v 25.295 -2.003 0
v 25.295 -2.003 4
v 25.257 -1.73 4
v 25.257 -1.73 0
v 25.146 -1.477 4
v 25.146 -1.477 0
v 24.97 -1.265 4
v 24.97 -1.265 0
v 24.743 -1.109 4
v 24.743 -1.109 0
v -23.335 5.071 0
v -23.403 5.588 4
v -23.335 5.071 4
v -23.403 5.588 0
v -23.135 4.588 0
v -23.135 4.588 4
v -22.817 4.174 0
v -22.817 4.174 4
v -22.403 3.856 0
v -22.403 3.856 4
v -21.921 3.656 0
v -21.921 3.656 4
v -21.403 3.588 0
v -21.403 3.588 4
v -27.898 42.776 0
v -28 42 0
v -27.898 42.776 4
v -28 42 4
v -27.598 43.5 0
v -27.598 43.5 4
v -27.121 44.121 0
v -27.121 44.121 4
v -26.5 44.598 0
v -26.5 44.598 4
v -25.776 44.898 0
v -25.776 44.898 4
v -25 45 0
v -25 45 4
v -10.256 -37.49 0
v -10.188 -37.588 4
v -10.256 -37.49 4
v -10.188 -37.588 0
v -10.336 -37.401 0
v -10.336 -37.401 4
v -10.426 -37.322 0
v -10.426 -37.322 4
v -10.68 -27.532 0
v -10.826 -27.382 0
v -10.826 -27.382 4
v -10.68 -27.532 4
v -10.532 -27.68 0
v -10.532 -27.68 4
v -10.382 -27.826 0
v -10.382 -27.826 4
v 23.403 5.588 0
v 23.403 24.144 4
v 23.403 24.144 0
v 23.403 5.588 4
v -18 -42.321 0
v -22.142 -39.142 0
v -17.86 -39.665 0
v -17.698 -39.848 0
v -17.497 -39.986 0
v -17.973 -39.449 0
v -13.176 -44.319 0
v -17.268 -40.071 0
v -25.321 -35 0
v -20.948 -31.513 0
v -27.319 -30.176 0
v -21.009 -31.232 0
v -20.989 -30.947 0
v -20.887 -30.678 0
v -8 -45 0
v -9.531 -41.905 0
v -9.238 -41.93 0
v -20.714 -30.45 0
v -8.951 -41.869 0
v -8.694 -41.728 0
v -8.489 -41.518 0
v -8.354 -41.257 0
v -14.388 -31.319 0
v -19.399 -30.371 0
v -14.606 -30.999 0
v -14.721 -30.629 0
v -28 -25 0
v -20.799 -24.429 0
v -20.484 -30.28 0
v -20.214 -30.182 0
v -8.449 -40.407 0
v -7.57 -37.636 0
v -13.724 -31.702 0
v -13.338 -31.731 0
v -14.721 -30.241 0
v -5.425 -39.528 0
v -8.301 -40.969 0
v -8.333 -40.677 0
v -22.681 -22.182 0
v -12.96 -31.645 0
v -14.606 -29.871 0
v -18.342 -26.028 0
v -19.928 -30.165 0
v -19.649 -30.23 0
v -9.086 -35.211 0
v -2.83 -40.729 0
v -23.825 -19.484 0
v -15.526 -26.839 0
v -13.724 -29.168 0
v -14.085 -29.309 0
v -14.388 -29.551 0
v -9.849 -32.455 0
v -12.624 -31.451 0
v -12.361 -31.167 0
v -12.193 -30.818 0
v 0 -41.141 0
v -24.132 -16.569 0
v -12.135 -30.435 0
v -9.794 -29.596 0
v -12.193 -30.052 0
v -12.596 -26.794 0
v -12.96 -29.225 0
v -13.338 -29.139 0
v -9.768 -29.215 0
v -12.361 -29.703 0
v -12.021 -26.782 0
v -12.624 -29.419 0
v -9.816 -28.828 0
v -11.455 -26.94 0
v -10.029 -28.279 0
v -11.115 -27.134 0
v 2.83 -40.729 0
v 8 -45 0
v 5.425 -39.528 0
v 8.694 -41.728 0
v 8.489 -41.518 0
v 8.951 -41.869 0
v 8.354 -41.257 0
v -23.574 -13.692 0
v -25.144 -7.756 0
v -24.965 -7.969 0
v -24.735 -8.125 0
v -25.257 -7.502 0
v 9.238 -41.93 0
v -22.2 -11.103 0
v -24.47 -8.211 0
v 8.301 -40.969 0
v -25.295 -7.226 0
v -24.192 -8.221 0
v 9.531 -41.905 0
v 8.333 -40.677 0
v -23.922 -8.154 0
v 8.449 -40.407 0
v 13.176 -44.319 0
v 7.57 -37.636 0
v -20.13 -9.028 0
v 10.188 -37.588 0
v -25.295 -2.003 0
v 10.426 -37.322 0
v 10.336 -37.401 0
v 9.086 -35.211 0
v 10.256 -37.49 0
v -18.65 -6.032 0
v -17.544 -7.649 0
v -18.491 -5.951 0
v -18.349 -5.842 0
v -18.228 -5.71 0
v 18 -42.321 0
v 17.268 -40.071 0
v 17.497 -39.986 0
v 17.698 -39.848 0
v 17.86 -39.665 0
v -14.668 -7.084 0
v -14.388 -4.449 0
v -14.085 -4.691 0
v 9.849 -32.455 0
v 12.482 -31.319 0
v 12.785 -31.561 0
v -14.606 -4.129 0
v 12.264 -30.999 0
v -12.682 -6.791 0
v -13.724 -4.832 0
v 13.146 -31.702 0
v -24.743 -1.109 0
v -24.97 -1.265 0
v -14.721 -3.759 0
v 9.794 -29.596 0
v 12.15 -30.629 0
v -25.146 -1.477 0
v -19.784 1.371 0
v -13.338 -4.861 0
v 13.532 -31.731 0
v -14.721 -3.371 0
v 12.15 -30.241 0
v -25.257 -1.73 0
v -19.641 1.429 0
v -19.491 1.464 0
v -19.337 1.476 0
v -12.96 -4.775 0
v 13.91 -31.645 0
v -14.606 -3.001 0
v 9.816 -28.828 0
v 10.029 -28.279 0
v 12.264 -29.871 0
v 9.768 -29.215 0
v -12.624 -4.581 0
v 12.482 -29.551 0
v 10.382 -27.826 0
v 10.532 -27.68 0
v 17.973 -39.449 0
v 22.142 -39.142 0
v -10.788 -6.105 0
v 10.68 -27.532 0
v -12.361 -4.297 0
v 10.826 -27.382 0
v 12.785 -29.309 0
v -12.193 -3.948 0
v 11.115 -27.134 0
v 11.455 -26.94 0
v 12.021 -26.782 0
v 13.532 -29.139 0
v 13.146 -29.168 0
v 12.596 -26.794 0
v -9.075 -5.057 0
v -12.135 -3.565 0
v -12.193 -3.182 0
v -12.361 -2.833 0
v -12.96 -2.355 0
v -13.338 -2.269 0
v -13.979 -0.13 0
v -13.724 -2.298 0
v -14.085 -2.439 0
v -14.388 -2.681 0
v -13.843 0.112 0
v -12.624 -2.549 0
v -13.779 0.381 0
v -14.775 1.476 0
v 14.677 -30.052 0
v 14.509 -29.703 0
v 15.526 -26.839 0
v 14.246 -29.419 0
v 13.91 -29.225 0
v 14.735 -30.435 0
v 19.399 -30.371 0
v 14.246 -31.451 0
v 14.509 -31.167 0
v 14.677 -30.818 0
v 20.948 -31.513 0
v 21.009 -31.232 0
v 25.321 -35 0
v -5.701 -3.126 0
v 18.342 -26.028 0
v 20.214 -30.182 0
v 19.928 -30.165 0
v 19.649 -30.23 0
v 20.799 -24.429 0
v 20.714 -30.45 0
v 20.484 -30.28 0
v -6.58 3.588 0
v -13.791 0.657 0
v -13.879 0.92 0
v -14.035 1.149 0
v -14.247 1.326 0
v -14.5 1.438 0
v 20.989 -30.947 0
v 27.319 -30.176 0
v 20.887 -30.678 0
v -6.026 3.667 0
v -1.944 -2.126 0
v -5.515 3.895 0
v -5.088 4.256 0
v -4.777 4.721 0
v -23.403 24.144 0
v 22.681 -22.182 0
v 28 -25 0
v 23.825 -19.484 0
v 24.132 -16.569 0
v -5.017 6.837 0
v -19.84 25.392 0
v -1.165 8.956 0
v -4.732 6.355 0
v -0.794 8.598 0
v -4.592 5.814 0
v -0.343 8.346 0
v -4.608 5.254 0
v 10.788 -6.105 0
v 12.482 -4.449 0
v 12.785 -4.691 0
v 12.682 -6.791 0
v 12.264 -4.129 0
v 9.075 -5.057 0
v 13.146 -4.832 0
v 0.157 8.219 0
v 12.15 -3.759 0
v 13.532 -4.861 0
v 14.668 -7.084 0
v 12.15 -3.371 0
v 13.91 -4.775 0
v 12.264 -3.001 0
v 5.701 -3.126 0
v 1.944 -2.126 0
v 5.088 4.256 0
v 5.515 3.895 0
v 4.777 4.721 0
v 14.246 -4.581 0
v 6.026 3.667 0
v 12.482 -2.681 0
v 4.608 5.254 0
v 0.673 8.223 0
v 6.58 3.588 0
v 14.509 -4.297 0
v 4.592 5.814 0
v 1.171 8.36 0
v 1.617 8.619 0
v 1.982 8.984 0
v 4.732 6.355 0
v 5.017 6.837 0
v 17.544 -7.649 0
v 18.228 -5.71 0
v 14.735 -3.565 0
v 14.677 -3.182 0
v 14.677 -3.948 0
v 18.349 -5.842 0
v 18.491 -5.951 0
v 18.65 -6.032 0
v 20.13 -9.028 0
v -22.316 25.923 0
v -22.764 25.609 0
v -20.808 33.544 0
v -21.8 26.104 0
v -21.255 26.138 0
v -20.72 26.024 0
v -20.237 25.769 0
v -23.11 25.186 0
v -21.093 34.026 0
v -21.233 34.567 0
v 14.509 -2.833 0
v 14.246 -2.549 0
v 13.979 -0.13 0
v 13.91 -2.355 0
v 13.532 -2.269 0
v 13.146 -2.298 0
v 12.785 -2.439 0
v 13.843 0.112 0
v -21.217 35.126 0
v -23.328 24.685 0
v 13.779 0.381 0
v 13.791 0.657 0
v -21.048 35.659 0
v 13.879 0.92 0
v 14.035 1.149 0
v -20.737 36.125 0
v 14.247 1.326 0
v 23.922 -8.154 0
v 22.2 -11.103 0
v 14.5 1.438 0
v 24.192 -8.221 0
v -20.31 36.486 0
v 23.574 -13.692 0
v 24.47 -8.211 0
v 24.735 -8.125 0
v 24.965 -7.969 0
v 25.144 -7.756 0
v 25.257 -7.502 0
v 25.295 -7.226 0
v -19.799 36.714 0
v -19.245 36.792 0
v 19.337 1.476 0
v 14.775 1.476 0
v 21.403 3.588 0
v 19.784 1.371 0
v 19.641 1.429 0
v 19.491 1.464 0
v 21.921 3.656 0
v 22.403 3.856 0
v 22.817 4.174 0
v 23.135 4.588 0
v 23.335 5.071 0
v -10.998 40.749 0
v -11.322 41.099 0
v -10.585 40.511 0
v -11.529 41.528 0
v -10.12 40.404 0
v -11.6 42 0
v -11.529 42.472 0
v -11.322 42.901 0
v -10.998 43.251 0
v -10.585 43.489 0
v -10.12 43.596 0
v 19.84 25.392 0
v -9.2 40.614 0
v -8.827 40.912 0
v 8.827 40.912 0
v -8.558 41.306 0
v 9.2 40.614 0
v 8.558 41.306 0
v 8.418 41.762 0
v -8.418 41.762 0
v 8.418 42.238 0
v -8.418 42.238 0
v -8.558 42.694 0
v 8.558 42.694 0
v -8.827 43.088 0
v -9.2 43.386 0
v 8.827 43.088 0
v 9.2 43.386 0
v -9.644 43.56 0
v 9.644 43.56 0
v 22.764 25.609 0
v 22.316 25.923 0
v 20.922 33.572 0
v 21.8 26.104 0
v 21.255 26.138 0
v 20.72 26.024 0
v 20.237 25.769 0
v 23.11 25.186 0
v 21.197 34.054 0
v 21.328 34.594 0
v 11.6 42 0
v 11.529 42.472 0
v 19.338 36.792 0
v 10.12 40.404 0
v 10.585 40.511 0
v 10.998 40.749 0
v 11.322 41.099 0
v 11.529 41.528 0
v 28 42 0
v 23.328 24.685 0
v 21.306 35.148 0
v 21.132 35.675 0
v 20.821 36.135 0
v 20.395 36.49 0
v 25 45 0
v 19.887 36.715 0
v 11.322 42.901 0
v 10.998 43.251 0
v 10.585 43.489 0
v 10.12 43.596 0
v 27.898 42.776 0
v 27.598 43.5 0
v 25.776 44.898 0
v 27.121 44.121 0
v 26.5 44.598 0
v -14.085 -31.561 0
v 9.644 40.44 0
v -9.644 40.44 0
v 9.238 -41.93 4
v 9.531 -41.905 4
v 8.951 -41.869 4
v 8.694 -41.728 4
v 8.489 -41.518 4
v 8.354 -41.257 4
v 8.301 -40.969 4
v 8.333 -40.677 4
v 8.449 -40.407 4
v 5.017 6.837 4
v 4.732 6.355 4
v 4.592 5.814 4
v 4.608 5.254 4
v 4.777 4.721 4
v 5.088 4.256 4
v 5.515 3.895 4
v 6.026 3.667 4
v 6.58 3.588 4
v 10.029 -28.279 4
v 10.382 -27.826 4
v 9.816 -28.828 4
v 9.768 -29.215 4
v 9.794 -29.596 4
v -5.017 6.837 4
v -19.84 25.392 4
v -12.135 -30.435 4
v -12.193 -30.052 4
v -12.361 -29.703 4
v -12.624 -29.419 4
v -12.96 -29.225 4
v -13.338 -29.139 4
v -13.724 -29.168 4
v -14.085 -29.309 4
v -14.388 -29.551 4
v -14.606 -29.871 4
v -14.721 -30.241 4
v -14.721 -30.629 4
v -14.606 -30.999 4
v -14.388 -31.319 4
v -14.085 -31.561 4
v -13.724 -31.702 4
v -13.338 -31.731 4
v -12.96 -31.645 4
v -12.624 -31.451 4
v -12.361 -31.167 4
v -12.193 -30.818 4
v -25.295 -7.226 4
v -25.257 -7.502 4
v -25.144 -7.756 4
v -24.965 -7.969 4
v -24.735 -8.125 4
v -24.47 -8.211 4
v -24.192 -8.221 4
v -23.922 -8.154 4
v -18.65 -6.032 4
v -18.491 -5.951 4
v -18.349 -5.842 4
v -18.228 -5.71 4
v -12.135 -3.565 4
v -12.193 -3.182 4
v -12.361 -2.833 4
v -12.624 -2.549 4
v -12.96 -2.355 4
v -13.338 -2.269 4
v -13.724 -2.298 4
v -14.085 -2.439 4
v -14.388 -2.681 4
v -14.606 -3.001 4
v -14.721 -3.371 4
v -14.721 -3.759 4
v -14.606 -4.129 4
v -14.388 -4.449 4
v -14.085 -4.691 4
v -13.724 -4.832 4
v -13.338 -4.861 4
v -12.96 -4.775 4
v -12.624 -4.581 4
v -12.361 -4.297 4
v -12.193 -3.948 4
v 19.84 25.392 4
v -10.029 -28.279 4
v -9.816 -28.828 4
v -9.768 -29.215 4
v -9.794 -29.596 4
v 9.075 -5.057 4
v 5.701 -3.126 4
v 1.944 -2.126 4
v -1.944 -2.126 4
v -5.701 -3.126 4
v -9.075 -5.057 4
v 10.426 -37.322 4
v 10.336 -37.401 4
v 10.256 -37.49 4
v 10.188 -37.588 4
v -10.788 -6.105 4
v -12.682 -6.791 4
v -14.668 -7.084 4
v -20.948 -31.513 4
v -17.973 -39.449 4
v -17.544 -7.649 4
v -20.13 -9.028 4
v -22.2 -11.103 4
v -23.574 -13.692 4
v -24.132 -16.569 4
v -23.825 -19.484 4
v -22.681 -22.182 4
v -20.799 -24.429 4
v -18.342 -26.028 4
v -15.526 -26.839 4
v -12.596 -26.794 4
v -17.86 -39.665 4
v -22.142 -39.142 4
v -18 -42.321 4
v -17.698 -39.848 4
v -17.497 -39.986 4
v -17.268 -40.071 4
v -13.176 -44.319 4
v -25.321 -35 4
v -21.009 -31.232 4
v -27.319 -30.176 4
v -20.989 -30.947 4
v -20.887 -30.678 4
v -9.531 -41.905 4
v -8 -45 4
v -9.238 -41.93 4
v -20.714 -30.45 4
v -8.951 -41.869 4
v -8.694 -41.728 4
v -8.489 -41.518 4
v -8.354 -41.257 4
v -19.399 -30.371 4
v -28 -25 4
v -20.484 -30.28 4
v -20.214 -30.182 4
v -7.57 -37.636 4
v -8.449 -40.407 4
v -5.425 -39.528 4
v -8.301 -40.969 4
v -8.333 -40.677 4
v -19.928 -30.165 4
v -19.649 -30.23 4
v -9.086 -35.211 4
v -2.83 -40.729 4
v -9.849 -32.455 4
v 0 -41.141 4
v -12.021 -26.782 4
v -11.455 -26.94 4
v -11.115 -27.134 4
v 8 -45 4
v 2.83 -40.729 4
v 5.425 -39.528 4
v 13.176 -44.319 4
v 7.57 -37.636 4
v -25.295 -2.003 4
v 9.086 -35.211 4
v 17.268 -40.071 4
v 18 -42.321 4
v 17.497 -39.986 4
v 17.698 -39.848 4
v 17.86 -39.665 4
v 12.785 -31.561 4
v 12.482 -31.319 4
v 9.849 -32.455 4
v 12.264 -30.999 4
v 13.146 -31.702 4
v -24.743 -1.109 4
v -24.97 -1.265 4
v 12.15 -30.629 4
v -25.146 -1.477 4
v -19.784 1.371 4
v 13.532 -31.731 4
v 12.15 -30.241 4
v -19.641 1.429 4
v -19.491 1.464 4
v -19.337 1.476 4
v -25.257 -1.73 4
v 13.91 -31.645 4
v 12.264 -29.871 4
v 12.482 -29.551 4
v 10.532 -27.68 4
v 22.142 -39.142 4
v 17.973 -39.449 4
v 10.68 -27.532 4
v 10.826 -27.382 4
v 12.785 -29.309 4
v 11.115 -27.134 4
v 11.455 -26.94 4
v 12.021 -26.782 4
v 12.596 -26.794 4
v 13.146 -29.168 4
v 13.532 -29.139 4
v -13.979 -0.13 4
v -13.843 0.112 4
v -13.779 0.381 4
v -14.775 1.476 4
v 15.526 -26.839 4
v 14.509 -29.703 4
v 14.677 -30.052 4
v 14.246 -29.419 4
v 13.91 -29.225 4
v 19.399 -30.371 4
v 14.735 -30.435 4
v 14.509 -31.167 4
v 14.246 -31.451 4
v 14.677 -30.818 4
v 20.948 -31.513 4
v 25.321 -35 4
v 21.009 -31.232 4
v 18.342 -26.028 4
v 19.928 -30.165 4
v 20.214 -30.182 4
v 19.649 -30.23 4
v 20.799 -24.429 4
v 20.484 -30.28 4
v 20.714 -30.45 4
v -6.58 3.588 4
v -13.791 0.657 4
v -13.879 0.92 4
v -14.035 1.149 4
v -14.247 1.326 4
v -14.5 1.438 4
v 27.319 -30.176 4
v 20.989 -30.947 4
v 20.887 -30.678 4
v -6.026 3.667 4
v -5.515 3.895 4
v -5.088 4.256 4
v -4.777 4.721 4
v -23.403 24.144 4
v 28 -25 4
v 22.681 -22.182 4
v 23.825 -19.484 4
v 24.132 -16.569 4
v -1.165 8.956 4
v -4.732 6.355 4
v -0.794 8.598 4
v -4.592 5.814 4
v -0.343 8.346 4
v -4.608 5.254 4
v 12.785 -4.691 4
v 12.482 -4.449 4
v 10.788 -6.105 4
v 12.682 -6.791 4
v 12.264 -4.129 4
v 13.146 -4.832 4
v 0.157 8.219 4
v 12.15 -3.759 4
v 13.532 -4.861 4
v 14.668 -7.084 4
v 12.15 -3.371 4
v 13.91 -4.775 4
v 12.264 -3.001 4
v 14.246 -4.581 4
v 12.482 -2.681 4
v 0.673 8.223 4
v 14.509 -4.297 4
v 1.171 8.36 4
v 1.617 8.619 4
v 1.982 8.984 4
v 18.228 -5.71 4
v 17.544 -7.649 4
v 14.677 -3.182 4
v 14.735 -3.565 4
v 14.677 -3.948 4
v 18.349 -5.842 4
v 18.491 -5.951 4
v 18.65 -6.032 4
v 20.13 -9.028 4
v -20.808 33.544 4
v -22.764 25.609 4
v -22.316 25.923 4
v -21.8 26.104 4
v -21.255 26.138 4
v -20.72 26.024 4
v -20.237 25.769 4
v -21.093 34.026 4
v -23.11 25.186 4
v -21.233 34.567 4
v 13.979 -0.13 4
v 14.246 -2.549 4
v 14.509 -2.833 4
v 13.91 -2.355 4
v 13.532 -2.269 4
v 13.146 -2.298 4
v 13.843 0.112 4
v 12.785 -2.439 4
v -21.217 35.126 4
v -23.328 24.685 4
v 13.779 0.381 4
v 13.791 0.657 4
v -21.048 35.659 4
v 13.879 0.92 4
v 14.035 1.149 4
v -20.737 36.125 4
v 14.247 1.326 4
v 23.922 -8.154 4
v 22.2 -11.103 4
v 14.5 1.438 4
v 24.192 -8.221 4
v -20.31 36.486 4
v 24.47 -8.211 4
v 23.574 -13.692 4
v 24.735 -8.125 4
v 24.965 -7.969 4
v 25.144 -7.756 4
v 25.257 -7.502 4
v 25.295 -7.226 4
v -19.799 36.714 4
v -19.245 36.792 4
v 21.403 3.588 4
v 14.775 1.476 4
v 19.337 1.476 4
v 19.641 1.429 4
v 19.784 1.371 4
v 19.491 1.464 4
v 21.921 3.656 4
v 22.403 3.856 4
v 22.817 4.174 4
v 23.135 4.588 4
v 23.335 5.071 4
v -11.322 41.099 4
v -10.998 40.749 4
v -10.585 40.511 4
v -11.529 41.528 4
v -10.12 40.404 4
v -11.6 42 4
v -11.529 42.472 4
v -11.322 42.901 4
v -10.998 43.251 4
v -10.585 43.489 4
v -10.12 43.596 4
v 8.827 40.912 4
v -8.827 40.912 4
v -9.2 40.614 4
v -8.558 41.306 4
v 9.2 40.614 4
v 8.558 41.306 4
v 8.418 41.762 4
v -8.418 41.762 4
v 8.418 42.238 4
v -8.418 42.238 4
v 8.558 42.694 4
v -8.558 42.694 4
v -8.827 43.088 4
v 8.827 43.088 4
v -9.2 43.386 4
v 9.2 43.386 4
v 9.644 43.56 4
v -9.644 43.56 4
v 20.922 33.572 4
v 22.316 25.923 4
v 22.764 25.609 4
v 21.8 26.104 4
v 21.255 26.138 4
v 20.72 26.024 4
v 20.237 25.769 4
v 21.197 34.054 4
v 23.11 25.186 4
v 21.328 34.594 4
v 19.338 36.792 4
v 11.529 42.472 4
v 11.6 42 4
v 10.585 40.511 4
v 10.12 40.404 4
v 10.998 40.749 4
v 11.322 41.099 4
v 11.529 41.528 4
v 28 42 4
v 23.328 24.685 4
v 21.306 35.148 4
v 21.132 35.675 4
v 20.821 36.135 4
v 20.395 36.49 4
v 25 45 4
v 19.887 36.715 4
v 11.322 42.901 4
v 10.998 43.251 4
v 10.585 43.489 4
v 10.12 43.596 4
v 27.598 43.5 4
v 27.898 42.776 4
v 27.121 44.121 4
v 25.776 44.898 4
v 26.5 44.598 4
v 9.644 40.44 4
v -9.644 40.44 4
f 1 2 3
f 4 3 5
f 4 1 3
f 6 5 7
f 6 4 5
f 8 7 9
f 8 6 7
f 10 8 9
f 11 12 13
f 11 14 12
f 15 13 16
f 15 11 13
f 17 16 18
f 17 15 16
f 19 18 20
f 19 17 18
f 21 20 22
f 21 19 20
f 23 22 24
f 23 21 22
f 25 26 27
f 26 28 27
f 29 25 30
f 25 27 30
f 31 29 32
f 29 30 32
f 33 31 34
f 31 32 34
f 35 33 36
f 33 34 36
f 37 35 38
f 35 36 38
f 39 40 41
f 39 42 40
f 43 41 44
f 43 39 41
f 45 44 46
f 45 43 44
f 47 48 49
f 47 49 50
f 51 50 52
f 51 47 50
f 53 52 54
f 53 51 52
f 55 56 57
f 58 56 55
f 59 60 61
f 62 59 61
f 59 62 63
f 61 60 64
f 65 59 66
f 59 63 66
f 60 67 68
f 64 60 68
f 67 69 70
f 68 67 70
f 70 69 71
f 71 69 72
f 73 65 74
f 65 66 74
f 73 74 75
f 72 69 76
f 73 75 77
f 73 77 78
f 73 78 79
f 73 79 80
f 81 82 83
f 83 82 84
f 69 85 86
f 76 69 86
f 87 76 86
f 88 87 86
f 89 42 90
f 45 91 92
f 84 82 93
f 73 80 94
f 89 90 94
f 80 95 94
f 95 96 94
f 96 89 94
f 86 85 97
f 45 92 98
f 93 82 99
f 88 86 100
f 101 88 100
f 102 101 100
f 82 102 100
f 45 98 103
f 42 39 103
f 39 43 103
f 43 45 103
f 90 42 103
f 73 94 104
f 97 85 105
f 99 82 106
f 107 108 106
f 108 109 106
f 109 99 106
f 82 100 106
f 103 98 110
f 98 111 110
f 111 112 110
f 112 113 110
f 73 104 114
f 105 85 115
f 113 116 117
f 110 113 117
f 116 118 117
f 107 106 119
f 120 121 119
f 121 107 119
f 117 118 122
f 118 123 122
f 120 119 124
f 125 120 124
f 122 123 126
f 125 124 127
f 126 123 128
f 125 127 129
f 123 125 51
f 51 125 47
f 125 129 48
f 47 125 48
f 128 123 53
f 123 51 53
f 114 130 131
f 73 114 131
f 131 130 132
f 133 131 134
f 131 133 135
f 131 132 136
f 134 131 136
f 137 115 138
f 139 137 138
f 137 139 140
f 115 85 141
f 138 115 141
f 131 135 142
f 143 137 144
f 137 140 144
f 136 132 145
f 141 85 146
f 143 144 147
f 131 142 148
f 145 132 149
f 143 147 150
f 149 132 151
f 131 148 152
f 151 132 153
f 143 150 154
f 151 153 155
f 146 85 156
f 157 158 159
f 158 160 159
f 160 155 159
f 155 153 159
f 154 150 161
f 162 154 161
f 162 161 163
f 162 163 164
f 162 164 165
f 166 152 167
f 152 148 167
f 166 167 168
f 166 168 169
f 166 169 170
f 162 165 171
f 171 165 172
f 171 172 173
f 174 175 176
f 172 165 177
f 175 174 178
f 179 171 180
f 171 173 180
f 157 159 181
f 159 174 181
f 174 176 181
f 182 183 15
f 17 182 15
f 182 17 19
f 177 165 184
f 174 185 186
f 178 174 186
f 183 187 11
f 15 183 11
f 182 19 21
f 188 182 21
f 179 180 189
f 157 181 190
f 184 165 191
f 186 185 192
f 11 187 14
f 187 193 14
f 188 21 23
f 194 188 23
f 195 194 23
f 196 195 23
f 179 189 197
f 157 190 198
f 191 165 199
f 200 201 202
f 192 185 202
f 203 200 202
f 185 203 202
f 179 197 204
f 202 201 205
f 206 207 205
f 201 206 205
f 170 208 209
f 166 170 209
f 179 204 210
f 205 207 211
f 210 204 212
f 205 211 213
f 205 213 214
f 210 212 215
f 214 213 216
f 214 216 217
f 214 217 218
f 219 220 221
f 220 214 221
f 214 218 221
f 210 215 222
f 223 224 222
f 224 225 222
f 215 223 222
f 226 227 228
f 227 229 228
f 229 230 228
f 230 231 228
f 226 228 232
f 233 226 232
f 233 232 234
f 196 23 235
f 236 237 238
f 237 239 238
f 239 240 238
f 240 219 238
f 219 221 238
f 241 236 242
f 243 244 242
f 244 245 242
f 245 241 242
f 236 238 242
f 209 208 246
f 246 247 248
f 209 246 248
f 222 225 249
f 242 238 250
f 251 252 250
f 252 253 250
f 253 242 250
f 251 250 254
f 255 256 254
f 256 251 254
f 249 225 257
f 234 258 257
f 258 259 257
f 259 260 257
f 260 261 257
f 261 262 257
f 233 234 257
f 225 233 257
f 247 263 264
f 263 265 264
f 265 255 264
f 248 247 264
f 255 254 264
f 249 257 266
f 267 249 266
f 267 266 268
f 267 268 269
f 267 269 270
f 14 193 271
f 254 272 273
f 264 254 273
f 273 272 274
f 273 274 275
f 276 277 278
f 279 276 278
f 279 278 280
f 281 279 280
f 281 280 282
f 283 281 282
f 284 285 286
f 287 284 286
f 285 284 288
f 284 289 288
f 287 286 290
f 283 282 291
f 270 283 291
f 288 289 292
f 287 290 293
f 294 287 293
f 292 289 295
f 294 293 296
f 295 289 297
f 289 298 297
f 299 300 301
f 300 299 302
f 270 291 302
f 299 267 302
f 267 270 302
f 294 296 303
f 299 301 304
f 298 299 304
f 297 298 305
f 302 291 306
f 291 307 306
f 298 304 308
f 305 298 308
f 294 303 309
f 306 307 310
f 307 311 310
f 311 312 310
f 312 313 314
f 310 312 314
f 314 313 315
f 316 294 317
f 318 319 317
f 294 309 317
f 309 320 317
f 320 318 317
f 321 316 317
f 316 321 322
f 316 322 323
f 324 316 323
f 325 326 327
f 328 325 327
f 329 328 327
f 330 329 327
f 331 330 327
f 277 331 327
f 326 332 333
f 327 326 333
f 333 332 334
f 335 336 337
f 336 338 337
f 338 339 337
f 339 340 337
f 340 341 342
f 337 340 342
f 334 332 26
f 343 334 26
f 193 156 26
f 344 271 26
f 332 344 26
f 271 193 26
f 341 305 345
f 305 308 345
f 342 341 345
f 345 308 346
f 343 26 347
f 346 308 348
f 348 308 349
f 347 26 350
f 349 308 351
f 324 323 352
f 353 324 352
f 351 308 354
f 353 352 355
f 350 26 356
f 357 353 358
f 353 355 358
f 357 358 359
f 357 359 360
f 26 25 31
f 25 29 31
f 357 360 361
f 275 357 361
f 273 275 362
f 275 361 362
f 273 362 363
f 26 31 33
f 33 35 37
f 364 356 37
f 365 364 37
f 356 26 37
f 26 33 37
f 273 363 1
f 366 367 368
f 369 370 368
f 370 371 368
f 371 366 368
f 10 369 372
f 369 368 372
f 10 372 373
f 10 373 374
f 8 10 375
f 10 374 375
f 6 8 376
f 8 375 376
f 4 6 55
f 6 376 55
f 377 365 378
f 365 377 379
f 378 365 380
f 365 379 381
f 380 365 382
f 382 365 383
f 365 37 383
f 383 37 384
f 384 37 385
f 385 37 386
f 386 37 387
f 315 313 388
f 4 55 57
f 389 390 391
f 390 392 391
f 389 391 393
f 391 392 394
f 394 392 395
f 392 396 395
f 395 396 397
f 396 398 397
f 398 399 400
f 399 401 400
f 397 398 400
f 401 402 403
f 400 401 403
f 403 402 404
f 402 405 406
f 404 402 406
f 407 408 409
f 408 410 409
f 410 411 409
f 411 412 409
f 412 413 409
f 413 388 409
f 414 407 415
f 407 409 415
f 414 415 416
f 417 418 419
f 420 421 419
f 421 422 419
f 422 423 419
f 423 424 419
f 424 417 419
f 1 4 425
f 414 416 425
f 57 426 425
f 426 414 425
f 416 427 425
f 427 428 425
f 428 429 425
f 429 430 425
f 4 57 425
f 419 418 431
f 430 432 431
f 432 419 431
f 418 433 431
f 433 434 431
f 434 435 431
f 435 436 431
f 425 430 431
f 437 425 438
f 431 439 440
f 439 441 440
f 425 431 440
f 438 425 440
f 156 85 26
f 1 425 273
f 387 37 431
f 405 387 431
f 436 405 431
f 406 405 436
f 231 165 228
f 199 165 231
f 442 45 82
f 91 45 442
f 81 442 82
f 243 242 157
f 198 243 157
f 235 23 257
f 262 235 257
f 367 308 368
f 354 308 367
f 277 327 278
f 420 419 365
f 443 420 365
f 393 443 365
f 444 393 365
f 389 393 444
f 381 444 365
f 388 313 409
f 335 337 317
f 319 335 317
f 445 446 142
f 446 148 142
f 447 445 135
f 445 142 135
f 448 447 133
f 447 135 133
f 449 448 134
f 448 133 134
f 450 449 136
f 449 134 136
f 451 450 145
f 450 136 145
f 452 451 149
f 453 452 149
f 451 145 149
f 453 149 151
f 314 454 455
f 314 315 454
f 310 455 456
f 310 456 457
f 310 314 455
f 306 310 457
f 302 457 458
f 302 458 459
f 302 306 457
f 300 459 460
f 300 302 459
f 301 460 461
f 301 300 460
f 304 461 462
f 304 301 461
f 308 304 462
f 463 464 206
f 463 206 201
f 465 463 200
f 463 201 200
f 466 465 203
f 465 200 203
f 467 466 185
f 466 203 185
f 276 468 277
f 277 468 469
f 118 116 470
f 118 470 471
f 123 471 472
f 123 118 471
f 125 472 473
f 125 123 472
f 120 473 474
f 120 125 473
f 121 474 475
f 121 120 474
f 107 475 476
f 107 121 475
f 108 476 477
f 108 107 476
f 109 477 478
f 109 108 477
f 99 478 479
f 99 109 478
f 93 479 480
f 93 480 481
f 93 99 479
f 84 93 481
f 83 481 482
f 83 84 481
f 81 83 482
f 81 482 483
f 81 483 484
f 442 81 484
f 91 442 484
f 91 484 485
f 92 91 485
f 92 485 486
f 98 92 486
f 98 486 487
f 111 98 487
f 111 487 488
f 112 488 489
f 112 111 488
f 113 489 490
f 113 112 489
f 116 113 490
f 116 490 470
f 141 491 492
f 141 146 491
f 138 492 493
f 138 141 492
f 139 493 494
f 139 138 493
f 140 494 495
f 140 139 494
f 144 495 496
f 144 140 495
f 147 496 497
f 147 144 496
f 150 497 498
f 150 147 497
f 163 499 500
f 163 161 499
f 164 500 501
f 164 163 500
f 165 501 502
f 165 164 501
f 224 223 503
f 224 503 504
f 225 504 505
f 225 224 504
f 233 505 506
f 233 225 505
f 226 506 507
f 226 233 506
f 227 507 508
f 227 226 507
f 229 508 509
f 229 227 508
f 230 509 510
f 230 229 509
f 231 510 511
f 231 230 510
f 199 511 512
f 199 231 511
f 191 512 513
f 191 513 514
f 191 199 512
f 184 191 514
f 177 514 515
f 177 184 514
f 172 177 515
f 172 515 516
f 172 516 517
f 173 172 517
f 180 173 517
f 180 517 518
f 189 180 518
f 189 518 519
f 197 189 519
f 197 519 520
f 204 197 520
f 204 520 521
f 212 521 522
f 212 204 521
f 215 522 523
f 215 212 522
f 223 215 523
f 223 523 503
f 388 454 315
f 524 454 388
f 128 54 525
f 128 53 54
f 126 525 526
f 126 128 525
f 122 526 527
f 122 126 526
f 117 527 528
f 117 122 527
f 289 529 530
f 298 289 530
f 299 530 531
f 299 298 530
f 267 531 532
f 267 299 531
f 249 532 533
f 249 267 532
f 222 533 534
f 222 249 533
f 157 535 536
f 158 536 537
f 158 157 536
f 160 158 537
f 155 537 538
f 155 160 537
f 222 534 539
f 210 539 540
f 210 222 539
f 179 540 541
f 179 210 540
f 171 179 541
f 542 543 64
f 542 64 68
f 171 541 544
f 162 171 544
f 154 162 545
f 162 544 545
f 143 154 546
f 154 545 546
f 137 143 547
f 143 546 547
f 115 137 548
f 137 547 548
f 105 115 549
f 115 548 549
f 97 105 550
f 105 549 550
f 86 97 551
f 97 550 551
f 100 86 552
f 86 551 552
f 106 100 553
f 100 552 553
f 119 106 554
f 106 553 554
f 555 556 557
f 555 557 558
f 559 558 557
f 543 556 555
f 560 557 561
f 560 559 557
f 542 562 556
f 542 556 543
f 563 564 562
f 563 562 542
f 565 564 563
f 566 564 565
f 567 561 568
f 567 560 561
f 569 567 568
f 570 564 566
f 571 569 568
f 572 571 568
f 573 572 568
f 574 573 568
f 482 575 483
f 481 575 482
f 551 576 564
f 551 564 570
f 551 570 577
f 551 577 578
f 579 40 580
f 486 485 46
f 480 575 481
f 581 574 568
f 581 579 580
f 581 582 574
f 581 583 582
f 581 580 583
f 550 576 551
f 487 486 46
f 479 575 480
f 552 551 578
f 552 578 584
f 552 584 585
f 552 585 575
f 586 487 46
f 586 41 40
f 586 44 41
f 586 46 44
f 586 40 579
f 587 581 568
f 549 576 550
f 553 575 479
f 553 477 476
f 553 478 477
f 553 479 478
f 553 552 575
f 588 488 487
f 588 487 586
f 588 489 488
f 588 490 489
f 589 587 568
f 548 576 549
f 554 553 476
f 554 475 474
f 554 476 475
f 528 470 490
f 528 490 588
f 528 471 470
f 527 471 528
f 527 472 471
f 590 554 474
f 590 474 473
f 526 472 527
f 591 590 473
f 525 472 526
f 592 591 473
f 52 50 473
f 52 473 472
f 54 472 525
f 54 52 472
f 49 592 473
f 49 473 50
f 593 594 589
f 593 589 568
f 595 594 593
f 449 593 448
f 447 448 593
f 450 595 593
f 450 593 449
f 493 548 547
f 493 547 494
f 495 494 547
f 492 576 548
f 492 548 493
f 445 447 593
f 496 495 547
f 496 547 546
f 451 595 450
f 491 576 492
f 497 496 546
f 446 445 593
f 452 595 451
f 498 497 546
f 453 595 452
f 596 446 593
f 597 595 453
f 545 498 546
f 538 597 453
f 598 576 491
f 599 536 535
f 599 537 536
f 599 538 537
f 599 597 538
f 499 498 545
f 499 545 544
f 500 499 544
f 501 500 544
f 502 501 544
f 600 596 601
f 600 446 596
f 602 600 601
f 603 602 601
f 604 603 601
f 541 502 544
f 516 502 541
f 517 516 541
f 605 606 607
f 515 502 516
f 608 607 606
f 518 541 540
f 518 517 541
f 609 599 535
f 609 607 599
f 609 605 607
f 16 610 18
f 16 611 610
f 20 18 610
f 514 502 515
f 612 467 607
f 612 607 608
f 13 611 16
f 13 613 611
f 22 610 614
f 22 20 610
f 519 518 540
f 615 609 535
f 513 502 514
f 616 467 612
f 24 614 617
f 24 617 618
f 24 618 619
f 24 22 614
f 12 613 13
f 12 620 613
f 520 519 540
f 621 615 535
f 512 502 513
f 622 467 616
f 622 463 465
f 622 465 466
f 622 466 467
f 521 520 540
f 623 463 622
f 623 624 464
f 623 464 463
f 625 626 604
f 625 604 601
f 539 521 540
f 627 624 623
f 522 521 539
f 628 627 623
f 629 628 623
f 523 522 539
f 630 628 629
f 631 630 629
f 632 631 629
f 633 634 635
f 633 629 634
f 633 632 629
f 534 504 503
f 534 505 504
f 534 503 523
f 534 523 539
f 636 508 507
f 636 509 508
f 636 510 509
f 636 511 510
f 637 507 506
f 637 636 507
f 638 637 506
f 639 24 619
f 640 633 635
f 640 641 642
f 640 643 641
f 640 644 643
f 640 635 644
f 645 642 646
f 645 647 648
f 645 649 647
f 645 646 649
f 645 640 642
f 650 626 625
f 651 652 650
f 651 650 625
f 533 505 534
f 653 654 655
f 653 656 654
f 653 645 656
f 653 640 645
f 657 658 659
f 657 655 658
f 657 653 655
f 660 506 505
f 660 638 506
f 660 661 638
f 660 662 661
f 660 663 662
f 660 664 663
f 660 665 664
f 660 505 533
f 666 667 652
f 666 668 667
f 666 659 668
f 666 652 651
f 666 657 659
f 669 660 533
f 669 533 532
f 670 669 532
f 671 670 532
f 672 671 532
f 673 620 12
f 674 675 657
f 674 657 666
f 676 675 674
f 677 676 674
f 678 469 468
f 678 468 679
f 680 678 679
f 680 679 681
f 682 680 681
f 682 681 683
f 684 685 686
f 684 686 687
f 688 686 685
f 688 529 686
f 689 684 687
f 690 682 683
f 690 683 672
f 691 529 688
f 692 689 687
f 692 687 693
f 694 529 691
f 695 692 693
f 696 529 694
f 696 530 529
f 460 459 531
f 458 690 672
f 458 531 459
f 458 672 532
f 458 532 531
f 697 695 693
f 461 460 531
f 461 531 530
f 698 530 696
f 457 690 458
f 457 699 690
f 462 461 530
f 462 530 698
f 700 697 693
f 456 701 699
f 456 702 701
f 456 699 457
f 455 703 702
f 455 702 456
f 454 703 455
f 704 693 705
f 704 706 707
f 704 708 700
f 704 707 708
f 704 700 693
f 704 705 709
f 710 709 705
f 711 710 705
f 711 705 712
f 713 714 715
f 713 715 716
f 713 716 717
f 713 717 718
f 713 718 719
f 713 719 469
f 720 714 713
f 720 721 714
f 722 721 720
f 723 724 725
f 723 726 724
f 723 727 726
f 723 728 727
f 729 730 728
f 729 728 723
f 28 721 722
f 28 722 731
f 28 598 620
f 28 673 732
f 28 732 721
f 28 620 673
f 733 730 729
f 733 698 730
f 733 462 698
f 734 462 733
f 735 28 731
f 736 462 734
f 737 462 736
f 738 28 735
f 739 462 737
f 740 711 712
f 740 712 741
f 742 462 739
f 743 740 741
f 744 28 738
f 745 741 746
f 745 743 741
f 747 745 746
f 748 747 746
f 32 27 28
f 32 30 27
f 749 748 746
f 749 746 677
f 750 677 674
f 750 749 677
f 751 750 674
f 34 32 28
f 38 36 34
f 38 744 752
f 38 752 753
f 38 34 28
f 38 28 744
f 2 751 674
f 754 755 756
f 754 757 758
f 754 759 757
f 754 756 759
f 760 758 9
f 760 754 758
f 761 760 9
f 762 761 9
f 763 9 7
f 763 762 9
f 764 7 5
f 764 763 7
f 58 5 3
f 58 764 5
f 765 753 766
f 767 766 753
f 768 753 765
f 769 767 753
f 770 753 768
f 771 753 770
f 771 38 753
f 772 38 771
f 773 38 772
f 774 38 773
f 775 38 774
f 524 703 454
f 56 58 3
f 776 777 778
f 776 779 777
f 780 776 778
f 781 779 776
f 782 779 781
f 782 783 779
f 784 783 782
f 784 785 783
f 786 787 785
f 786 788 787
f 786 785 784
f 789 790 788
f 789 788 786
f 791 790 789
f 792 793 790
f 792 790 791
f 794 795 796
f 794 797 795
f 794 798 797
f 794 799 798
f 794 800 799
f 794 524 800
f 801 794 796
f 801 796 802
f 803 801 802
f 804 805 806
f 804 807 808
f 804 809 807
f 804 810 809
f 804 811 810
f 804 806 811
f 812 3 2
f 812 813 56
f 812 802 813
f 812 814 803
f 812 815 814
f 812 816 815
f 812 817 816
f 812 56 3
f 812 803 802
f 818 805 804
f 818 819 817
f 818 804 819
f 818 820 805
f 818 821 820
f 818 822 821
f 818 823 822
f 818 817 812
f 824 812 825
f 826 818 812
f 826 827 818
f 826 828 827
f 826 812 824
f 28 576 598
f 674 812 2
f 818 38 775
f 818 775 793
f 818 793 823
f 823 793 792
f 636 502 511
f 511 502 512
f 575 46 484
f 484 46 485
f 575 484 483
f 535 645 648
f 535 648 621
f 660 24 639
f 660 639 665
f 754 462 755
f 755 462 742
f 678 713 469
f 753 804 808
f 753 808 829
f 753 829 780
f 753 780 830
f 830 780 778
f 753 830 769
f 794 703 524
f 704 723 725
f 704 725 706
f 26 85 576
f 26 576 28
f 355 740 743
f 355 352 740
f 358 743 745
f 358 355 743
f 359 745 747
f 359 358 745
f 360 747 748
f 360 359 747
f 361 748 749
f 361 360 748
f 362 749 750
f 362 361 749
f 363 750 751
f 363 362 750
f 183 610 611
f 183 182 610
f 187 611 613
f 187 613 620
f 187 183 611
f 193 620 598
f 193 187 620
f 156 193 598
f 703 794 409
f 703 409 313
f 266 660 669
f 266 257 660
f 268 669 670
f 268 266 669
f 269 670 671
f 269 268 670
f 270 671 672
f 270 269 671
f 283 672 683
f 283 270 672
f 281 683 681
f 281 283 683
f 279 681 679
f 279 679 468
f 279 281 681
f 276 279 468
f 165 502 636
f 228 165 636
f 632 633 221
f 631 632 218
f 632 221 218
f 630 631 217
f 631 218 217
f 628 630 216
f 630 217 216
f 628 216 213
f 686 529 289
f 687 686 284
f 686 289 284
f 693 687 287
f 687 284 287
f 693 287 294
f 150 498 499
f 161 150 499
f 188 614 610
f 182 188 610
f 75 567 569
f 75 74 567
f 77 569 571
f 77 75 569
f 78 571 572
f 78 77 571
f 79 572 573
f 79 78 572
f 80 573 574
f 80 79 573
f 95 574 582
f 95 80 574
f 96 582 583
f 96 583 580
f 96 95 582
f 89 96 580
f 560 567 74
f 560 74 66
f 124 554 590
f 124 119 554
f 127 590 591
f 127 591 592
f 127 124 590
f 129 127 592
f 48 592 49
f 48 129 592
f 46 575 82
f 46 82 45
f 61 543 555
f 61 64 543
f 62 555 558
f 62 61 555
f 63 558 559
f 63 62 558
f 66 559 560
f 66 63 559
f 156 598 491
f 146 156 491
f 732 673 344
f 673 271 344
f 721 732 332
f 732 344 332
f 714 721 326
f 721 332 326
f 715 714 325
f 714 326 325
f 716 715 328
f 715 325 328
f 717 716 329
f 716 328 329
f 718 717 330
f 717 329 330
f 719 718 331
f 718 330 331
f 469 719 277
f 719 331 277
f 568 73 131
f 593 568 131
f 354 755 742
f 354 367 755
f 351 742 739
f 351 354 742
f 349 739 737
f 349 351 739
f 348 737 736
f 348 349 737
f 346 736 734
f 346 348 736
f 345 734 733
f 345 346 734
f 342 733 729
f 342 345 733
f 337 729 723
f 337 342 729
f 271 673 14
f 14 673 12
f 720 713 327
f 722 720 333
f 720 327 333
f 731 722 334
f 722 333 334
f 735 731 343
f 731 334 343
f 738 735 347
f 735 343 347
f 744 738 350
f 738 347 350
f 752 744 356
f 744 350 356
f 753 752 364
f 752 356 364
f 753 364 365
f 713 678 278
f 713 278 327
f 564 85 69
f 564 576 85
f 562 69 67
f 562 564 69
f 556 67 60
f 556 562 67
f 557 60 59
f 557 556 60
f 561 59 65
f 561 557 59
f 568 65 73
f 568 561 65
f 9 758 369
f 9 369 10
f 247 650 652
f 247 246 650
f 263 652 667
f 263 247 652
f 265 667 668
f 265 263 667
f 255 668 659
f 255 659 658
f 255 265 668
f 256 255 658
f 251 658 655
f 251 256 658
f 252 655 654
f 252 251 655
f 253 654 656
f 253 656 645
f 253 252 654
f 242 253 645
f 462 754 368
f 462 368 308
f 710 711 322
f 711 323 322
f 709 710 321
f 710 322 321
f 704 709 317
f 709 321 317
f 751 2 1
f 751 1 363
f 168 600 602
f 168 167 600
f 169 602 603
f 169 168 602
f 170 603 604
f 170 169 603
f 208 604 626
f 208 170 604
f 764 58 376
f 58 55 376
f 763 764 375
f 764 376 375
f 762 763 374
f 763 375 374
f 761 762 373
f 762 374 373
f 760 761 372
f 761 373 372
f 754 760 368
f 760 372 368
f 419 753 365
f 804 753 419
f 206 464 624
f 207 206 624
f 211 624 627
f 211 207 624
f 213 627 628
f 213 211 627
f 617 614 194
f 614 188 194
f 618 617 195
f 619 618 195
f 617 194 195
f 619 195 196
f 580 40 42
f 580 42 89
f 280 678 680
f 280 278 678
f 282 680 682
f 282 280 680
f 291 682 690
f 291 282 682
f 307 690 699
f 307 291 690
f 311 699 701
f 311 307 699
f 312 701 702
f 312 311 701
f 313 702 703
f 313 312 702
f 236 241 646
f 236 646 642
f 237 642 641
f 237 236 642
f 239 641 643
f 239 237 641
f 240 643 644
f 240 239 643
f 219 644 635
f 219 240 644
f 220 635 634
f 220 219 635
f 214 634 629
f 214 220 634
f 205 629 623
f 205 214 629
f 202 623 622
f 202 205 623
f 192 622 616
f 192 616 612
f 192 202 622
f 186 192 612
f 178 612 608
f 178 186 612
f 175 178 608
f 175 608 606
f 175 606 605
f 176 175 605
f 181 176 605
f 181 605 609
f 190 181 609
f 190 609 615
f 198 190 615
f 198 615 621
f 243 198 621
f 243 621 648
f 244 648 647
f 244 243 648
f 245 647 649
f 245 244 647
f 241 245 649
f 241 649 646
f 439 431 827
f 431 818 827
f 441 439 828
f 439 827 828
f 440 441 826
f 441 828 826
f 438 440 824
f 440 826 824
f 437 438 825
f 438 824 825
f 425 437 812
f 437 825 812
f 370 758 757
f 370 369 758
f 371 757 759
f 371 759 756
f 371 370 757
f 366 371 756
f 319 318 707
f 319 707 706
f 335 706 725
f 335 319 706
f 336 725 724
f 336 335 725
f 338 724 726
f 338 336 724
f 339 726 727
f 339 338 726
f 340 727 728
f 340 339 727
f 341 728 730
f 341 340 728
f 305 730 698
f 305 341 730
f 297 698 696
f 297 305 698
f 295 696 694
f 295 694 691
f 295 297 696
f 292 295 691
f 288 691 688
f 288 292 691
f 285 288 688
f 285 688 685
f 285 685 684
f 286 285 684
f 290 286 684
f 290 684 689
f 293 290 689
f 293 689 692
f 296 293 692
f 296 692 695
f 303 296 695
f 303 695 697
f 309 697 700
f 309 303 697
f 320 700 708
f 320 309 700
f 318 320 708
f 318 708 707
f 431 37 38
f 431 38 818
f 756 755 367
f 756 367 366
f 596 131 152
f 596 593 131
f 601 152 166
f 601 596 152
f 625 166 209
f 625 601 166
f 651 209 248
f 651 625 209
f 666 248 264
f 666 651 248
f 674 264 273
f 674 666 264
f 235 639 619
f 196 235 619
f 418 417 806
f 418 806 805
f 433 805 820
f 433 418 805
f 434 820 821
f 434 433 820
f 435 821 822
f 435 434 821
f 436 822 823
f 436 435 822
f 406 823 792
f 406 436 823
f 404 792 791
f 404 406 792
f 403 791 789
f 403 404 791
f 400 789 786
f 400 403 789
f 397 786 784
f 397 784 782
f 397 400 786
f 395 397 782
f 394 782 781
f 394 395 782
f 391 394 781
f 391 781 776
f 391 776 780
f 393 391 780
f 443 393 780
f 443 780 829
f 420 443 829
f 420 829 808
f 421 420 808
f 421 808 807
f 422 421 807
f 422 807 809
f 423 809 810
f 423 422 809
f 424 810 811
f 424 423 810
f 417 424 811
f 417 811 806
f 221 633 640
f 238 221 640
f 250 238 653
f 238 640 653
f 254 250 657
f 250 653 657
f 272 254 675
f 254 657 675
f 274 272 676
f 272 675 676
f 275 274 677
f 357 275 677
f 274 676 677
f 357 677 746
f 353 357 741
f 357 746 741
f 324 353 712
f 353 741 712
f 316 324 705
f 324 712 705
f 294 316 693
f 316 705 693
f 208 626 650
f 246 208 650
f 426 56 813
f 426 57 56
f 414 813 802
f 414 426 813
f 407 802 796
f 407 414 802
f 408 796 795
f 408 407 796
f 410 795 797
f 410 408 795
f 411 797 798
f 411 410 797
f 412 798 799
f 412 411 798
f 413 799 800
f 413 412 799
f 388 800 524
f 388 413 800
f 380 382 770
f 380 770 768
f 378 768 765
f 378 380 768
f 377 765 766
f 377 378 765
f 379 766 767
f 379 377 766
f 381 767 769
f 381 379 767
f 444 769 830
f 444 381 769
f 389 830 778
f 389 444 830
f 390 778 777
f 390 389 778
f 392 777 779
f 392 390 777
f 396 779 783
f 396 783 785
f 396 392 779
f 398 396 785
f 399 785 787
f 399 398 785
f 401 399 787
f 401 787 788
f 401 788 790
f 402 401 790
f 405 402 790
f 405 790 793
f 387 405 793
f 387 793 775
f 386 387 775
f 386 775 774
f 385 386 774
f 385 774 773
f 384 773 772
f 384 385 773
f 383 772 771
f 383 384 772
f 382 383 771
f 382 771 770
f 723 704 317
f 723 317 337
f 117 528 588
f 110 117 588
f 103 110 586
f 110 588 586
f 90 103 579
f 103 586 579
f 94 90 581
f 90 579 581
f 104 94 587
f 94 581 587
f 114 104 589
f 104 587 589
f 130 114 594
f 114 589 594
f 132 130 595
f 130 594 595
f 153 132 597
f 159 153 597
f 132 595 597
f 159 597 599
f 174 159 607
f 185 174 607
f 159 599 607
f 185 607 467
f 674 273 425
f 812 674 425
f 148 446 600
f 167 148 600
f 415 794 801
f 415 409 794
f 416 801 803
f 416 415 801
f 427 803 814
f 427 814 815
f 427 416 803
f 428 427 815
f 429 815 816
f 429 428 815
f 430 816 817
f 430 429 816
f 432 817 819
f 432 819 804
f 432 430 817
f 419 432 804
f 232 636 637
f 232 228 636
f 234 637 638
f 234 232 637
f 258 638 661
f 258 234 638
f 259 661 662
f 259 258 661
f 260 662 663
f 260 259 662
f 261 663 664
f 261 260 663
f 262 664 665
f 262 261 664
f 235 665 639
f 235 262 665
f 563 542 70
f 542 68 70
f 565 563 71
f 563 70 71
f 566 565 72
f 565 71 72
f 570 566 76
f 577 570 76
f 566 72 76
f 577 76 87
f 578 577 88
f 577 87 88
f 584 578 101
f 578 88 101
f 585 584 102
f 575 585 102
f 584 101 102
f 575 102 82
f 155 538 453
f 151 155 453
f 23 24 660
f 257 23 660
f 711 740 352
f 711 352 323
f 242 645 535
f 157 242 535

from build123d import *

# Parameters (mm, degrees)
SKETCH_1_W          = 56
SKETCH_1_H          = 90
SKETCH_1_R          = 1.6
SKETCH_1_R_2        = 1.3
SKETCH_1_R_3        = 15
EXTRUDE_1_DEPTH     = 4
FILLET_1_R          = 20
CUT_EXTRUDE_1_DEPTH = 54.150729064
FILLET_2_R          = 2
FILLET_3_R          = 3
CUT_EXTRUDE_2_DEPTH = 54.150729064
FILLET_4_R          = 10
FILLET_5_R          = 2
CUT_EXTRUDE_3_DEPTH = 54.150729209
FILLET_6_R          = 1
CUT_EXTRUDE_4_DEPTH = 54.150729209
FILLET_7_R          = 1


with BuildPart() as part:
    # 草图1 → 凸台-拉伸1 (new body)
    with BuildSketch(Plane.XY):
        Rectangle(SKETCH_1_W, SKETCH_1_H)
        with Locations((10, 42)):
            Circle(SKETCH_1_R, mode=Mode.SUBTRACT)
        with Locations(Location((-10, 42, 0), (0, 0, 180))):
            Circle(SKETCH_1_R, mode=Mode.SUBTRACT)
        with Locations((13.435028843, -3.564971157)):
            Circle(SKETCH_1_R_2, mode=Mode.SUBTRACT)
        with Locations((13.435028843, -30.435028843)):
            Circle(SKETCH_1_R_2, mode=Mode.SUBTRACT)
        with Locations((-13.435028843, -30.435028843)):
            Circle(SKETCH_1_R_2, mode=Mode.SUBTRACT)
        with Locations((-13.435028843, -3.564971157)):
            Circle(SKETCH_1_R_2, mode=Mode.SUBTRACT)
        with Locations((0, -17)):
            Circle(SKETCH_1_R_3, mode=Mode.SUBTRACT)
    extrude(amount=EXTRUDE_1_DEPTH)

    # 圆角1
    fillet_1_edges = [part.edges().sort_by_distance(p)[0] for p in [
        (28, -45, 2),
        (-28, -45, 2),
    ]]
    fillet(fillet_1_edges, radius=FILLET_1_R)

    # 草图2 → 切除-拉伸1 (cut, through all)
    with BuildSketch(Plane.XY.offset(4)):
        Polygon((-23.403006558, 36.792468572), (23.403006558, 36.792468572), (0.426117862, 6.963948605), align=None)
        Polygon((-23.403006558, 29.851631864), (-23.403006558, 3.588347177), (-2.422043399, 3.588347177), align=None)
        Polygon((23.403006558, 3.588347177), (2.422043399, 3.588347177), (23.403006558, 29.851631864), align=None)
    extrude(amount=-CUT_EXTRUDE_1_DEPTH, mode=Mode.SUBTRACT)

    # 圆角2
    fillet_2_edges = [part.edges().sort_by_distance(p)[0] for p in [
        (23.403006558, 29.851631864, 2),
        (23.403006558, 3.588347177, 2),
        (2.422043399, 3.588347177, 2),
        (-23.403006558, 29.851631864, 2),
        (-2.422043399, 3.588347177, 2),
        (-23.403006558, 3.588347177, 2),
        (0.426117862, 6.963948605, 2),
        (-23.403006558, 36.792468572, 2),
        (23.403006558, 36.792468572, 2),
    ]]
    fillet(fillet_2_edges, radius=FILLET_2_R)

    # 圆角3
    fillet_3_edges = [part.edges().sort_by_distance(p)[0] for p in [
        (-28, 45, 2),
        (28, 45, 2),
    ]]
    fillet(fillet_3_edges, radius=FILLET_3_R)

    # 草图3 → 切除-拉伸2 (cut, through all)
    with BuildSketch(Plane.XY.offset(4)):
        with BuildLine():
            ThreePointArc((-9.563715622, -28.55574937), (0, -41.141196435), (9.563715622, -28.55574937))
            ThreePointArc((9.563715622, -28.55574937), (0, -32), (-9.563715622, -28.55574937))
        make_face()
        with BuildLine():
            ThreePointArc((-11.55574937, -7.436284378), (-24.141196435, -17), (-11.55574937, -26.563715622))
            ThreePointArc((-11.55574937, -26.563715622), (-15, -17), (-11.55574937, -7.436284378))
        make_face()
        with BuildLine():
            ThreePointArc((11.55574937, -26.563715622), (24.141196435, -17), (11.55574937, -7.436284378))
            ThreePointArc((11.55574937, -7.436284378), (15, -17), (11.55574937, -26.563715622))
        make_face()
    extrude(amount=-CUT_EXTRUDE_2_DEPTH, mode=Mode.SUBTRACT)

    # 圆角4
    fillet_4_edges = [part.edges().sort_by_distance(p)[0] for p in [
        (-11.55574937, -7.436284378, 2),
        (11.55574937, -7.436284378, 2),
    ]]
    fillet(fillet_4_edges, radius=FILLET_4_R)

    # 圆角5
    fillet_5_edges = [part.edges().sort_by_distance(p)[0] for p in [
        (-9.563715622, -28.55574937, 2),
        (9.563715622, -28.55574937, 2),
        (-11.55574937, -26.563715622, 2),
        (11.55574937, -26.563715622, 2),
    ]]
    fillet(fillet_5_edges, radius=FILLET_5_R)

    # 草图4 → 切除-拉伸3 (cut, through all)
    with BuildSketch(Plane.XY.offset(4)):
        Polygon((-22.184991746, -28.213177479), (-10.282808815, -37.433178341), (-7.181535798, -42.46226972), (-17.786358924, -39.94772403), align=None)
        Polygon((7.181535798, -42.46226972), (17.786358924, -39.94772403), (22.184991746, -28.213177479), (10.282808815, -37.433178341), align=None)
    extrude(amount=-CUT_EXTRUDE_3_DEPTH, mode=Mode.SUBTRACT)

    # 圆角6
    fillet_6_edges = [part.edges().sort_by_distance(p)[0] for p in [
        (-17.786358924, -39.94772403, 2),
        (-22.184991746, -28.213177479, 2),
        (-10.282808815, -37.433178341, 2),
        (-7.181535798, -42.46226972, 2),
        (7.181535798, -42.46226972, 2),
        (10.282808815, -37.433178341, 2),
        (22.184991746, -28.213177479, 2),
        (17.786358924, -39.94772403, 2),
    ]]
    fillet(fillet_6_edges, radius=FILLET_6_R)

    # 草图5 → 切除-拉伸4 (cut, through all)
    with BuildSketch(Plane.XY.offset(4)):
        Polygon((-19.572914927, 1.476160836), (-25.295441932, -1.385102666), (-25.295441932, -8.70657104), (-18.394747603, -5.929462346), (-12.756375408, 1.476160836), align=None)
        Polygon((18.394747603, -5.929462346), (12.756375408, 1.476160836), (19.572914927, 1.476160836), (25.295441932, -1.385102666), (25.295441932, -8.70657104), align=None)
    extrude(amount=-CUT_EXTRUDE_4_DEPTH, mode=Mode.SUBTRACT)

    # 圆角7
    fillet_7_edges = [part.edges().sort_by_distance(p)[0] for p in [
        (-19.572914927, 1.476160836, 2),
        (-12.756375408, 1.476160836, 2),
        (-18.394747603, -5.929462346, 2),
        (-25.295441932, -8.70657104, 2),
        (-25.295441932, -1.385102666, 2),
        (25.295441932, -8.70657104, 2),
        (18.394747603, -5.929462346, 2),
        (12.756375408, 1.476160836, 2),
        (19.572914927, 1.476160836, 2),
        (25.295441932, -1.385102666, 2),
    ]]
    fillet(fillet_7_edges, radius=FILLET_7_R)


solid = part.part
